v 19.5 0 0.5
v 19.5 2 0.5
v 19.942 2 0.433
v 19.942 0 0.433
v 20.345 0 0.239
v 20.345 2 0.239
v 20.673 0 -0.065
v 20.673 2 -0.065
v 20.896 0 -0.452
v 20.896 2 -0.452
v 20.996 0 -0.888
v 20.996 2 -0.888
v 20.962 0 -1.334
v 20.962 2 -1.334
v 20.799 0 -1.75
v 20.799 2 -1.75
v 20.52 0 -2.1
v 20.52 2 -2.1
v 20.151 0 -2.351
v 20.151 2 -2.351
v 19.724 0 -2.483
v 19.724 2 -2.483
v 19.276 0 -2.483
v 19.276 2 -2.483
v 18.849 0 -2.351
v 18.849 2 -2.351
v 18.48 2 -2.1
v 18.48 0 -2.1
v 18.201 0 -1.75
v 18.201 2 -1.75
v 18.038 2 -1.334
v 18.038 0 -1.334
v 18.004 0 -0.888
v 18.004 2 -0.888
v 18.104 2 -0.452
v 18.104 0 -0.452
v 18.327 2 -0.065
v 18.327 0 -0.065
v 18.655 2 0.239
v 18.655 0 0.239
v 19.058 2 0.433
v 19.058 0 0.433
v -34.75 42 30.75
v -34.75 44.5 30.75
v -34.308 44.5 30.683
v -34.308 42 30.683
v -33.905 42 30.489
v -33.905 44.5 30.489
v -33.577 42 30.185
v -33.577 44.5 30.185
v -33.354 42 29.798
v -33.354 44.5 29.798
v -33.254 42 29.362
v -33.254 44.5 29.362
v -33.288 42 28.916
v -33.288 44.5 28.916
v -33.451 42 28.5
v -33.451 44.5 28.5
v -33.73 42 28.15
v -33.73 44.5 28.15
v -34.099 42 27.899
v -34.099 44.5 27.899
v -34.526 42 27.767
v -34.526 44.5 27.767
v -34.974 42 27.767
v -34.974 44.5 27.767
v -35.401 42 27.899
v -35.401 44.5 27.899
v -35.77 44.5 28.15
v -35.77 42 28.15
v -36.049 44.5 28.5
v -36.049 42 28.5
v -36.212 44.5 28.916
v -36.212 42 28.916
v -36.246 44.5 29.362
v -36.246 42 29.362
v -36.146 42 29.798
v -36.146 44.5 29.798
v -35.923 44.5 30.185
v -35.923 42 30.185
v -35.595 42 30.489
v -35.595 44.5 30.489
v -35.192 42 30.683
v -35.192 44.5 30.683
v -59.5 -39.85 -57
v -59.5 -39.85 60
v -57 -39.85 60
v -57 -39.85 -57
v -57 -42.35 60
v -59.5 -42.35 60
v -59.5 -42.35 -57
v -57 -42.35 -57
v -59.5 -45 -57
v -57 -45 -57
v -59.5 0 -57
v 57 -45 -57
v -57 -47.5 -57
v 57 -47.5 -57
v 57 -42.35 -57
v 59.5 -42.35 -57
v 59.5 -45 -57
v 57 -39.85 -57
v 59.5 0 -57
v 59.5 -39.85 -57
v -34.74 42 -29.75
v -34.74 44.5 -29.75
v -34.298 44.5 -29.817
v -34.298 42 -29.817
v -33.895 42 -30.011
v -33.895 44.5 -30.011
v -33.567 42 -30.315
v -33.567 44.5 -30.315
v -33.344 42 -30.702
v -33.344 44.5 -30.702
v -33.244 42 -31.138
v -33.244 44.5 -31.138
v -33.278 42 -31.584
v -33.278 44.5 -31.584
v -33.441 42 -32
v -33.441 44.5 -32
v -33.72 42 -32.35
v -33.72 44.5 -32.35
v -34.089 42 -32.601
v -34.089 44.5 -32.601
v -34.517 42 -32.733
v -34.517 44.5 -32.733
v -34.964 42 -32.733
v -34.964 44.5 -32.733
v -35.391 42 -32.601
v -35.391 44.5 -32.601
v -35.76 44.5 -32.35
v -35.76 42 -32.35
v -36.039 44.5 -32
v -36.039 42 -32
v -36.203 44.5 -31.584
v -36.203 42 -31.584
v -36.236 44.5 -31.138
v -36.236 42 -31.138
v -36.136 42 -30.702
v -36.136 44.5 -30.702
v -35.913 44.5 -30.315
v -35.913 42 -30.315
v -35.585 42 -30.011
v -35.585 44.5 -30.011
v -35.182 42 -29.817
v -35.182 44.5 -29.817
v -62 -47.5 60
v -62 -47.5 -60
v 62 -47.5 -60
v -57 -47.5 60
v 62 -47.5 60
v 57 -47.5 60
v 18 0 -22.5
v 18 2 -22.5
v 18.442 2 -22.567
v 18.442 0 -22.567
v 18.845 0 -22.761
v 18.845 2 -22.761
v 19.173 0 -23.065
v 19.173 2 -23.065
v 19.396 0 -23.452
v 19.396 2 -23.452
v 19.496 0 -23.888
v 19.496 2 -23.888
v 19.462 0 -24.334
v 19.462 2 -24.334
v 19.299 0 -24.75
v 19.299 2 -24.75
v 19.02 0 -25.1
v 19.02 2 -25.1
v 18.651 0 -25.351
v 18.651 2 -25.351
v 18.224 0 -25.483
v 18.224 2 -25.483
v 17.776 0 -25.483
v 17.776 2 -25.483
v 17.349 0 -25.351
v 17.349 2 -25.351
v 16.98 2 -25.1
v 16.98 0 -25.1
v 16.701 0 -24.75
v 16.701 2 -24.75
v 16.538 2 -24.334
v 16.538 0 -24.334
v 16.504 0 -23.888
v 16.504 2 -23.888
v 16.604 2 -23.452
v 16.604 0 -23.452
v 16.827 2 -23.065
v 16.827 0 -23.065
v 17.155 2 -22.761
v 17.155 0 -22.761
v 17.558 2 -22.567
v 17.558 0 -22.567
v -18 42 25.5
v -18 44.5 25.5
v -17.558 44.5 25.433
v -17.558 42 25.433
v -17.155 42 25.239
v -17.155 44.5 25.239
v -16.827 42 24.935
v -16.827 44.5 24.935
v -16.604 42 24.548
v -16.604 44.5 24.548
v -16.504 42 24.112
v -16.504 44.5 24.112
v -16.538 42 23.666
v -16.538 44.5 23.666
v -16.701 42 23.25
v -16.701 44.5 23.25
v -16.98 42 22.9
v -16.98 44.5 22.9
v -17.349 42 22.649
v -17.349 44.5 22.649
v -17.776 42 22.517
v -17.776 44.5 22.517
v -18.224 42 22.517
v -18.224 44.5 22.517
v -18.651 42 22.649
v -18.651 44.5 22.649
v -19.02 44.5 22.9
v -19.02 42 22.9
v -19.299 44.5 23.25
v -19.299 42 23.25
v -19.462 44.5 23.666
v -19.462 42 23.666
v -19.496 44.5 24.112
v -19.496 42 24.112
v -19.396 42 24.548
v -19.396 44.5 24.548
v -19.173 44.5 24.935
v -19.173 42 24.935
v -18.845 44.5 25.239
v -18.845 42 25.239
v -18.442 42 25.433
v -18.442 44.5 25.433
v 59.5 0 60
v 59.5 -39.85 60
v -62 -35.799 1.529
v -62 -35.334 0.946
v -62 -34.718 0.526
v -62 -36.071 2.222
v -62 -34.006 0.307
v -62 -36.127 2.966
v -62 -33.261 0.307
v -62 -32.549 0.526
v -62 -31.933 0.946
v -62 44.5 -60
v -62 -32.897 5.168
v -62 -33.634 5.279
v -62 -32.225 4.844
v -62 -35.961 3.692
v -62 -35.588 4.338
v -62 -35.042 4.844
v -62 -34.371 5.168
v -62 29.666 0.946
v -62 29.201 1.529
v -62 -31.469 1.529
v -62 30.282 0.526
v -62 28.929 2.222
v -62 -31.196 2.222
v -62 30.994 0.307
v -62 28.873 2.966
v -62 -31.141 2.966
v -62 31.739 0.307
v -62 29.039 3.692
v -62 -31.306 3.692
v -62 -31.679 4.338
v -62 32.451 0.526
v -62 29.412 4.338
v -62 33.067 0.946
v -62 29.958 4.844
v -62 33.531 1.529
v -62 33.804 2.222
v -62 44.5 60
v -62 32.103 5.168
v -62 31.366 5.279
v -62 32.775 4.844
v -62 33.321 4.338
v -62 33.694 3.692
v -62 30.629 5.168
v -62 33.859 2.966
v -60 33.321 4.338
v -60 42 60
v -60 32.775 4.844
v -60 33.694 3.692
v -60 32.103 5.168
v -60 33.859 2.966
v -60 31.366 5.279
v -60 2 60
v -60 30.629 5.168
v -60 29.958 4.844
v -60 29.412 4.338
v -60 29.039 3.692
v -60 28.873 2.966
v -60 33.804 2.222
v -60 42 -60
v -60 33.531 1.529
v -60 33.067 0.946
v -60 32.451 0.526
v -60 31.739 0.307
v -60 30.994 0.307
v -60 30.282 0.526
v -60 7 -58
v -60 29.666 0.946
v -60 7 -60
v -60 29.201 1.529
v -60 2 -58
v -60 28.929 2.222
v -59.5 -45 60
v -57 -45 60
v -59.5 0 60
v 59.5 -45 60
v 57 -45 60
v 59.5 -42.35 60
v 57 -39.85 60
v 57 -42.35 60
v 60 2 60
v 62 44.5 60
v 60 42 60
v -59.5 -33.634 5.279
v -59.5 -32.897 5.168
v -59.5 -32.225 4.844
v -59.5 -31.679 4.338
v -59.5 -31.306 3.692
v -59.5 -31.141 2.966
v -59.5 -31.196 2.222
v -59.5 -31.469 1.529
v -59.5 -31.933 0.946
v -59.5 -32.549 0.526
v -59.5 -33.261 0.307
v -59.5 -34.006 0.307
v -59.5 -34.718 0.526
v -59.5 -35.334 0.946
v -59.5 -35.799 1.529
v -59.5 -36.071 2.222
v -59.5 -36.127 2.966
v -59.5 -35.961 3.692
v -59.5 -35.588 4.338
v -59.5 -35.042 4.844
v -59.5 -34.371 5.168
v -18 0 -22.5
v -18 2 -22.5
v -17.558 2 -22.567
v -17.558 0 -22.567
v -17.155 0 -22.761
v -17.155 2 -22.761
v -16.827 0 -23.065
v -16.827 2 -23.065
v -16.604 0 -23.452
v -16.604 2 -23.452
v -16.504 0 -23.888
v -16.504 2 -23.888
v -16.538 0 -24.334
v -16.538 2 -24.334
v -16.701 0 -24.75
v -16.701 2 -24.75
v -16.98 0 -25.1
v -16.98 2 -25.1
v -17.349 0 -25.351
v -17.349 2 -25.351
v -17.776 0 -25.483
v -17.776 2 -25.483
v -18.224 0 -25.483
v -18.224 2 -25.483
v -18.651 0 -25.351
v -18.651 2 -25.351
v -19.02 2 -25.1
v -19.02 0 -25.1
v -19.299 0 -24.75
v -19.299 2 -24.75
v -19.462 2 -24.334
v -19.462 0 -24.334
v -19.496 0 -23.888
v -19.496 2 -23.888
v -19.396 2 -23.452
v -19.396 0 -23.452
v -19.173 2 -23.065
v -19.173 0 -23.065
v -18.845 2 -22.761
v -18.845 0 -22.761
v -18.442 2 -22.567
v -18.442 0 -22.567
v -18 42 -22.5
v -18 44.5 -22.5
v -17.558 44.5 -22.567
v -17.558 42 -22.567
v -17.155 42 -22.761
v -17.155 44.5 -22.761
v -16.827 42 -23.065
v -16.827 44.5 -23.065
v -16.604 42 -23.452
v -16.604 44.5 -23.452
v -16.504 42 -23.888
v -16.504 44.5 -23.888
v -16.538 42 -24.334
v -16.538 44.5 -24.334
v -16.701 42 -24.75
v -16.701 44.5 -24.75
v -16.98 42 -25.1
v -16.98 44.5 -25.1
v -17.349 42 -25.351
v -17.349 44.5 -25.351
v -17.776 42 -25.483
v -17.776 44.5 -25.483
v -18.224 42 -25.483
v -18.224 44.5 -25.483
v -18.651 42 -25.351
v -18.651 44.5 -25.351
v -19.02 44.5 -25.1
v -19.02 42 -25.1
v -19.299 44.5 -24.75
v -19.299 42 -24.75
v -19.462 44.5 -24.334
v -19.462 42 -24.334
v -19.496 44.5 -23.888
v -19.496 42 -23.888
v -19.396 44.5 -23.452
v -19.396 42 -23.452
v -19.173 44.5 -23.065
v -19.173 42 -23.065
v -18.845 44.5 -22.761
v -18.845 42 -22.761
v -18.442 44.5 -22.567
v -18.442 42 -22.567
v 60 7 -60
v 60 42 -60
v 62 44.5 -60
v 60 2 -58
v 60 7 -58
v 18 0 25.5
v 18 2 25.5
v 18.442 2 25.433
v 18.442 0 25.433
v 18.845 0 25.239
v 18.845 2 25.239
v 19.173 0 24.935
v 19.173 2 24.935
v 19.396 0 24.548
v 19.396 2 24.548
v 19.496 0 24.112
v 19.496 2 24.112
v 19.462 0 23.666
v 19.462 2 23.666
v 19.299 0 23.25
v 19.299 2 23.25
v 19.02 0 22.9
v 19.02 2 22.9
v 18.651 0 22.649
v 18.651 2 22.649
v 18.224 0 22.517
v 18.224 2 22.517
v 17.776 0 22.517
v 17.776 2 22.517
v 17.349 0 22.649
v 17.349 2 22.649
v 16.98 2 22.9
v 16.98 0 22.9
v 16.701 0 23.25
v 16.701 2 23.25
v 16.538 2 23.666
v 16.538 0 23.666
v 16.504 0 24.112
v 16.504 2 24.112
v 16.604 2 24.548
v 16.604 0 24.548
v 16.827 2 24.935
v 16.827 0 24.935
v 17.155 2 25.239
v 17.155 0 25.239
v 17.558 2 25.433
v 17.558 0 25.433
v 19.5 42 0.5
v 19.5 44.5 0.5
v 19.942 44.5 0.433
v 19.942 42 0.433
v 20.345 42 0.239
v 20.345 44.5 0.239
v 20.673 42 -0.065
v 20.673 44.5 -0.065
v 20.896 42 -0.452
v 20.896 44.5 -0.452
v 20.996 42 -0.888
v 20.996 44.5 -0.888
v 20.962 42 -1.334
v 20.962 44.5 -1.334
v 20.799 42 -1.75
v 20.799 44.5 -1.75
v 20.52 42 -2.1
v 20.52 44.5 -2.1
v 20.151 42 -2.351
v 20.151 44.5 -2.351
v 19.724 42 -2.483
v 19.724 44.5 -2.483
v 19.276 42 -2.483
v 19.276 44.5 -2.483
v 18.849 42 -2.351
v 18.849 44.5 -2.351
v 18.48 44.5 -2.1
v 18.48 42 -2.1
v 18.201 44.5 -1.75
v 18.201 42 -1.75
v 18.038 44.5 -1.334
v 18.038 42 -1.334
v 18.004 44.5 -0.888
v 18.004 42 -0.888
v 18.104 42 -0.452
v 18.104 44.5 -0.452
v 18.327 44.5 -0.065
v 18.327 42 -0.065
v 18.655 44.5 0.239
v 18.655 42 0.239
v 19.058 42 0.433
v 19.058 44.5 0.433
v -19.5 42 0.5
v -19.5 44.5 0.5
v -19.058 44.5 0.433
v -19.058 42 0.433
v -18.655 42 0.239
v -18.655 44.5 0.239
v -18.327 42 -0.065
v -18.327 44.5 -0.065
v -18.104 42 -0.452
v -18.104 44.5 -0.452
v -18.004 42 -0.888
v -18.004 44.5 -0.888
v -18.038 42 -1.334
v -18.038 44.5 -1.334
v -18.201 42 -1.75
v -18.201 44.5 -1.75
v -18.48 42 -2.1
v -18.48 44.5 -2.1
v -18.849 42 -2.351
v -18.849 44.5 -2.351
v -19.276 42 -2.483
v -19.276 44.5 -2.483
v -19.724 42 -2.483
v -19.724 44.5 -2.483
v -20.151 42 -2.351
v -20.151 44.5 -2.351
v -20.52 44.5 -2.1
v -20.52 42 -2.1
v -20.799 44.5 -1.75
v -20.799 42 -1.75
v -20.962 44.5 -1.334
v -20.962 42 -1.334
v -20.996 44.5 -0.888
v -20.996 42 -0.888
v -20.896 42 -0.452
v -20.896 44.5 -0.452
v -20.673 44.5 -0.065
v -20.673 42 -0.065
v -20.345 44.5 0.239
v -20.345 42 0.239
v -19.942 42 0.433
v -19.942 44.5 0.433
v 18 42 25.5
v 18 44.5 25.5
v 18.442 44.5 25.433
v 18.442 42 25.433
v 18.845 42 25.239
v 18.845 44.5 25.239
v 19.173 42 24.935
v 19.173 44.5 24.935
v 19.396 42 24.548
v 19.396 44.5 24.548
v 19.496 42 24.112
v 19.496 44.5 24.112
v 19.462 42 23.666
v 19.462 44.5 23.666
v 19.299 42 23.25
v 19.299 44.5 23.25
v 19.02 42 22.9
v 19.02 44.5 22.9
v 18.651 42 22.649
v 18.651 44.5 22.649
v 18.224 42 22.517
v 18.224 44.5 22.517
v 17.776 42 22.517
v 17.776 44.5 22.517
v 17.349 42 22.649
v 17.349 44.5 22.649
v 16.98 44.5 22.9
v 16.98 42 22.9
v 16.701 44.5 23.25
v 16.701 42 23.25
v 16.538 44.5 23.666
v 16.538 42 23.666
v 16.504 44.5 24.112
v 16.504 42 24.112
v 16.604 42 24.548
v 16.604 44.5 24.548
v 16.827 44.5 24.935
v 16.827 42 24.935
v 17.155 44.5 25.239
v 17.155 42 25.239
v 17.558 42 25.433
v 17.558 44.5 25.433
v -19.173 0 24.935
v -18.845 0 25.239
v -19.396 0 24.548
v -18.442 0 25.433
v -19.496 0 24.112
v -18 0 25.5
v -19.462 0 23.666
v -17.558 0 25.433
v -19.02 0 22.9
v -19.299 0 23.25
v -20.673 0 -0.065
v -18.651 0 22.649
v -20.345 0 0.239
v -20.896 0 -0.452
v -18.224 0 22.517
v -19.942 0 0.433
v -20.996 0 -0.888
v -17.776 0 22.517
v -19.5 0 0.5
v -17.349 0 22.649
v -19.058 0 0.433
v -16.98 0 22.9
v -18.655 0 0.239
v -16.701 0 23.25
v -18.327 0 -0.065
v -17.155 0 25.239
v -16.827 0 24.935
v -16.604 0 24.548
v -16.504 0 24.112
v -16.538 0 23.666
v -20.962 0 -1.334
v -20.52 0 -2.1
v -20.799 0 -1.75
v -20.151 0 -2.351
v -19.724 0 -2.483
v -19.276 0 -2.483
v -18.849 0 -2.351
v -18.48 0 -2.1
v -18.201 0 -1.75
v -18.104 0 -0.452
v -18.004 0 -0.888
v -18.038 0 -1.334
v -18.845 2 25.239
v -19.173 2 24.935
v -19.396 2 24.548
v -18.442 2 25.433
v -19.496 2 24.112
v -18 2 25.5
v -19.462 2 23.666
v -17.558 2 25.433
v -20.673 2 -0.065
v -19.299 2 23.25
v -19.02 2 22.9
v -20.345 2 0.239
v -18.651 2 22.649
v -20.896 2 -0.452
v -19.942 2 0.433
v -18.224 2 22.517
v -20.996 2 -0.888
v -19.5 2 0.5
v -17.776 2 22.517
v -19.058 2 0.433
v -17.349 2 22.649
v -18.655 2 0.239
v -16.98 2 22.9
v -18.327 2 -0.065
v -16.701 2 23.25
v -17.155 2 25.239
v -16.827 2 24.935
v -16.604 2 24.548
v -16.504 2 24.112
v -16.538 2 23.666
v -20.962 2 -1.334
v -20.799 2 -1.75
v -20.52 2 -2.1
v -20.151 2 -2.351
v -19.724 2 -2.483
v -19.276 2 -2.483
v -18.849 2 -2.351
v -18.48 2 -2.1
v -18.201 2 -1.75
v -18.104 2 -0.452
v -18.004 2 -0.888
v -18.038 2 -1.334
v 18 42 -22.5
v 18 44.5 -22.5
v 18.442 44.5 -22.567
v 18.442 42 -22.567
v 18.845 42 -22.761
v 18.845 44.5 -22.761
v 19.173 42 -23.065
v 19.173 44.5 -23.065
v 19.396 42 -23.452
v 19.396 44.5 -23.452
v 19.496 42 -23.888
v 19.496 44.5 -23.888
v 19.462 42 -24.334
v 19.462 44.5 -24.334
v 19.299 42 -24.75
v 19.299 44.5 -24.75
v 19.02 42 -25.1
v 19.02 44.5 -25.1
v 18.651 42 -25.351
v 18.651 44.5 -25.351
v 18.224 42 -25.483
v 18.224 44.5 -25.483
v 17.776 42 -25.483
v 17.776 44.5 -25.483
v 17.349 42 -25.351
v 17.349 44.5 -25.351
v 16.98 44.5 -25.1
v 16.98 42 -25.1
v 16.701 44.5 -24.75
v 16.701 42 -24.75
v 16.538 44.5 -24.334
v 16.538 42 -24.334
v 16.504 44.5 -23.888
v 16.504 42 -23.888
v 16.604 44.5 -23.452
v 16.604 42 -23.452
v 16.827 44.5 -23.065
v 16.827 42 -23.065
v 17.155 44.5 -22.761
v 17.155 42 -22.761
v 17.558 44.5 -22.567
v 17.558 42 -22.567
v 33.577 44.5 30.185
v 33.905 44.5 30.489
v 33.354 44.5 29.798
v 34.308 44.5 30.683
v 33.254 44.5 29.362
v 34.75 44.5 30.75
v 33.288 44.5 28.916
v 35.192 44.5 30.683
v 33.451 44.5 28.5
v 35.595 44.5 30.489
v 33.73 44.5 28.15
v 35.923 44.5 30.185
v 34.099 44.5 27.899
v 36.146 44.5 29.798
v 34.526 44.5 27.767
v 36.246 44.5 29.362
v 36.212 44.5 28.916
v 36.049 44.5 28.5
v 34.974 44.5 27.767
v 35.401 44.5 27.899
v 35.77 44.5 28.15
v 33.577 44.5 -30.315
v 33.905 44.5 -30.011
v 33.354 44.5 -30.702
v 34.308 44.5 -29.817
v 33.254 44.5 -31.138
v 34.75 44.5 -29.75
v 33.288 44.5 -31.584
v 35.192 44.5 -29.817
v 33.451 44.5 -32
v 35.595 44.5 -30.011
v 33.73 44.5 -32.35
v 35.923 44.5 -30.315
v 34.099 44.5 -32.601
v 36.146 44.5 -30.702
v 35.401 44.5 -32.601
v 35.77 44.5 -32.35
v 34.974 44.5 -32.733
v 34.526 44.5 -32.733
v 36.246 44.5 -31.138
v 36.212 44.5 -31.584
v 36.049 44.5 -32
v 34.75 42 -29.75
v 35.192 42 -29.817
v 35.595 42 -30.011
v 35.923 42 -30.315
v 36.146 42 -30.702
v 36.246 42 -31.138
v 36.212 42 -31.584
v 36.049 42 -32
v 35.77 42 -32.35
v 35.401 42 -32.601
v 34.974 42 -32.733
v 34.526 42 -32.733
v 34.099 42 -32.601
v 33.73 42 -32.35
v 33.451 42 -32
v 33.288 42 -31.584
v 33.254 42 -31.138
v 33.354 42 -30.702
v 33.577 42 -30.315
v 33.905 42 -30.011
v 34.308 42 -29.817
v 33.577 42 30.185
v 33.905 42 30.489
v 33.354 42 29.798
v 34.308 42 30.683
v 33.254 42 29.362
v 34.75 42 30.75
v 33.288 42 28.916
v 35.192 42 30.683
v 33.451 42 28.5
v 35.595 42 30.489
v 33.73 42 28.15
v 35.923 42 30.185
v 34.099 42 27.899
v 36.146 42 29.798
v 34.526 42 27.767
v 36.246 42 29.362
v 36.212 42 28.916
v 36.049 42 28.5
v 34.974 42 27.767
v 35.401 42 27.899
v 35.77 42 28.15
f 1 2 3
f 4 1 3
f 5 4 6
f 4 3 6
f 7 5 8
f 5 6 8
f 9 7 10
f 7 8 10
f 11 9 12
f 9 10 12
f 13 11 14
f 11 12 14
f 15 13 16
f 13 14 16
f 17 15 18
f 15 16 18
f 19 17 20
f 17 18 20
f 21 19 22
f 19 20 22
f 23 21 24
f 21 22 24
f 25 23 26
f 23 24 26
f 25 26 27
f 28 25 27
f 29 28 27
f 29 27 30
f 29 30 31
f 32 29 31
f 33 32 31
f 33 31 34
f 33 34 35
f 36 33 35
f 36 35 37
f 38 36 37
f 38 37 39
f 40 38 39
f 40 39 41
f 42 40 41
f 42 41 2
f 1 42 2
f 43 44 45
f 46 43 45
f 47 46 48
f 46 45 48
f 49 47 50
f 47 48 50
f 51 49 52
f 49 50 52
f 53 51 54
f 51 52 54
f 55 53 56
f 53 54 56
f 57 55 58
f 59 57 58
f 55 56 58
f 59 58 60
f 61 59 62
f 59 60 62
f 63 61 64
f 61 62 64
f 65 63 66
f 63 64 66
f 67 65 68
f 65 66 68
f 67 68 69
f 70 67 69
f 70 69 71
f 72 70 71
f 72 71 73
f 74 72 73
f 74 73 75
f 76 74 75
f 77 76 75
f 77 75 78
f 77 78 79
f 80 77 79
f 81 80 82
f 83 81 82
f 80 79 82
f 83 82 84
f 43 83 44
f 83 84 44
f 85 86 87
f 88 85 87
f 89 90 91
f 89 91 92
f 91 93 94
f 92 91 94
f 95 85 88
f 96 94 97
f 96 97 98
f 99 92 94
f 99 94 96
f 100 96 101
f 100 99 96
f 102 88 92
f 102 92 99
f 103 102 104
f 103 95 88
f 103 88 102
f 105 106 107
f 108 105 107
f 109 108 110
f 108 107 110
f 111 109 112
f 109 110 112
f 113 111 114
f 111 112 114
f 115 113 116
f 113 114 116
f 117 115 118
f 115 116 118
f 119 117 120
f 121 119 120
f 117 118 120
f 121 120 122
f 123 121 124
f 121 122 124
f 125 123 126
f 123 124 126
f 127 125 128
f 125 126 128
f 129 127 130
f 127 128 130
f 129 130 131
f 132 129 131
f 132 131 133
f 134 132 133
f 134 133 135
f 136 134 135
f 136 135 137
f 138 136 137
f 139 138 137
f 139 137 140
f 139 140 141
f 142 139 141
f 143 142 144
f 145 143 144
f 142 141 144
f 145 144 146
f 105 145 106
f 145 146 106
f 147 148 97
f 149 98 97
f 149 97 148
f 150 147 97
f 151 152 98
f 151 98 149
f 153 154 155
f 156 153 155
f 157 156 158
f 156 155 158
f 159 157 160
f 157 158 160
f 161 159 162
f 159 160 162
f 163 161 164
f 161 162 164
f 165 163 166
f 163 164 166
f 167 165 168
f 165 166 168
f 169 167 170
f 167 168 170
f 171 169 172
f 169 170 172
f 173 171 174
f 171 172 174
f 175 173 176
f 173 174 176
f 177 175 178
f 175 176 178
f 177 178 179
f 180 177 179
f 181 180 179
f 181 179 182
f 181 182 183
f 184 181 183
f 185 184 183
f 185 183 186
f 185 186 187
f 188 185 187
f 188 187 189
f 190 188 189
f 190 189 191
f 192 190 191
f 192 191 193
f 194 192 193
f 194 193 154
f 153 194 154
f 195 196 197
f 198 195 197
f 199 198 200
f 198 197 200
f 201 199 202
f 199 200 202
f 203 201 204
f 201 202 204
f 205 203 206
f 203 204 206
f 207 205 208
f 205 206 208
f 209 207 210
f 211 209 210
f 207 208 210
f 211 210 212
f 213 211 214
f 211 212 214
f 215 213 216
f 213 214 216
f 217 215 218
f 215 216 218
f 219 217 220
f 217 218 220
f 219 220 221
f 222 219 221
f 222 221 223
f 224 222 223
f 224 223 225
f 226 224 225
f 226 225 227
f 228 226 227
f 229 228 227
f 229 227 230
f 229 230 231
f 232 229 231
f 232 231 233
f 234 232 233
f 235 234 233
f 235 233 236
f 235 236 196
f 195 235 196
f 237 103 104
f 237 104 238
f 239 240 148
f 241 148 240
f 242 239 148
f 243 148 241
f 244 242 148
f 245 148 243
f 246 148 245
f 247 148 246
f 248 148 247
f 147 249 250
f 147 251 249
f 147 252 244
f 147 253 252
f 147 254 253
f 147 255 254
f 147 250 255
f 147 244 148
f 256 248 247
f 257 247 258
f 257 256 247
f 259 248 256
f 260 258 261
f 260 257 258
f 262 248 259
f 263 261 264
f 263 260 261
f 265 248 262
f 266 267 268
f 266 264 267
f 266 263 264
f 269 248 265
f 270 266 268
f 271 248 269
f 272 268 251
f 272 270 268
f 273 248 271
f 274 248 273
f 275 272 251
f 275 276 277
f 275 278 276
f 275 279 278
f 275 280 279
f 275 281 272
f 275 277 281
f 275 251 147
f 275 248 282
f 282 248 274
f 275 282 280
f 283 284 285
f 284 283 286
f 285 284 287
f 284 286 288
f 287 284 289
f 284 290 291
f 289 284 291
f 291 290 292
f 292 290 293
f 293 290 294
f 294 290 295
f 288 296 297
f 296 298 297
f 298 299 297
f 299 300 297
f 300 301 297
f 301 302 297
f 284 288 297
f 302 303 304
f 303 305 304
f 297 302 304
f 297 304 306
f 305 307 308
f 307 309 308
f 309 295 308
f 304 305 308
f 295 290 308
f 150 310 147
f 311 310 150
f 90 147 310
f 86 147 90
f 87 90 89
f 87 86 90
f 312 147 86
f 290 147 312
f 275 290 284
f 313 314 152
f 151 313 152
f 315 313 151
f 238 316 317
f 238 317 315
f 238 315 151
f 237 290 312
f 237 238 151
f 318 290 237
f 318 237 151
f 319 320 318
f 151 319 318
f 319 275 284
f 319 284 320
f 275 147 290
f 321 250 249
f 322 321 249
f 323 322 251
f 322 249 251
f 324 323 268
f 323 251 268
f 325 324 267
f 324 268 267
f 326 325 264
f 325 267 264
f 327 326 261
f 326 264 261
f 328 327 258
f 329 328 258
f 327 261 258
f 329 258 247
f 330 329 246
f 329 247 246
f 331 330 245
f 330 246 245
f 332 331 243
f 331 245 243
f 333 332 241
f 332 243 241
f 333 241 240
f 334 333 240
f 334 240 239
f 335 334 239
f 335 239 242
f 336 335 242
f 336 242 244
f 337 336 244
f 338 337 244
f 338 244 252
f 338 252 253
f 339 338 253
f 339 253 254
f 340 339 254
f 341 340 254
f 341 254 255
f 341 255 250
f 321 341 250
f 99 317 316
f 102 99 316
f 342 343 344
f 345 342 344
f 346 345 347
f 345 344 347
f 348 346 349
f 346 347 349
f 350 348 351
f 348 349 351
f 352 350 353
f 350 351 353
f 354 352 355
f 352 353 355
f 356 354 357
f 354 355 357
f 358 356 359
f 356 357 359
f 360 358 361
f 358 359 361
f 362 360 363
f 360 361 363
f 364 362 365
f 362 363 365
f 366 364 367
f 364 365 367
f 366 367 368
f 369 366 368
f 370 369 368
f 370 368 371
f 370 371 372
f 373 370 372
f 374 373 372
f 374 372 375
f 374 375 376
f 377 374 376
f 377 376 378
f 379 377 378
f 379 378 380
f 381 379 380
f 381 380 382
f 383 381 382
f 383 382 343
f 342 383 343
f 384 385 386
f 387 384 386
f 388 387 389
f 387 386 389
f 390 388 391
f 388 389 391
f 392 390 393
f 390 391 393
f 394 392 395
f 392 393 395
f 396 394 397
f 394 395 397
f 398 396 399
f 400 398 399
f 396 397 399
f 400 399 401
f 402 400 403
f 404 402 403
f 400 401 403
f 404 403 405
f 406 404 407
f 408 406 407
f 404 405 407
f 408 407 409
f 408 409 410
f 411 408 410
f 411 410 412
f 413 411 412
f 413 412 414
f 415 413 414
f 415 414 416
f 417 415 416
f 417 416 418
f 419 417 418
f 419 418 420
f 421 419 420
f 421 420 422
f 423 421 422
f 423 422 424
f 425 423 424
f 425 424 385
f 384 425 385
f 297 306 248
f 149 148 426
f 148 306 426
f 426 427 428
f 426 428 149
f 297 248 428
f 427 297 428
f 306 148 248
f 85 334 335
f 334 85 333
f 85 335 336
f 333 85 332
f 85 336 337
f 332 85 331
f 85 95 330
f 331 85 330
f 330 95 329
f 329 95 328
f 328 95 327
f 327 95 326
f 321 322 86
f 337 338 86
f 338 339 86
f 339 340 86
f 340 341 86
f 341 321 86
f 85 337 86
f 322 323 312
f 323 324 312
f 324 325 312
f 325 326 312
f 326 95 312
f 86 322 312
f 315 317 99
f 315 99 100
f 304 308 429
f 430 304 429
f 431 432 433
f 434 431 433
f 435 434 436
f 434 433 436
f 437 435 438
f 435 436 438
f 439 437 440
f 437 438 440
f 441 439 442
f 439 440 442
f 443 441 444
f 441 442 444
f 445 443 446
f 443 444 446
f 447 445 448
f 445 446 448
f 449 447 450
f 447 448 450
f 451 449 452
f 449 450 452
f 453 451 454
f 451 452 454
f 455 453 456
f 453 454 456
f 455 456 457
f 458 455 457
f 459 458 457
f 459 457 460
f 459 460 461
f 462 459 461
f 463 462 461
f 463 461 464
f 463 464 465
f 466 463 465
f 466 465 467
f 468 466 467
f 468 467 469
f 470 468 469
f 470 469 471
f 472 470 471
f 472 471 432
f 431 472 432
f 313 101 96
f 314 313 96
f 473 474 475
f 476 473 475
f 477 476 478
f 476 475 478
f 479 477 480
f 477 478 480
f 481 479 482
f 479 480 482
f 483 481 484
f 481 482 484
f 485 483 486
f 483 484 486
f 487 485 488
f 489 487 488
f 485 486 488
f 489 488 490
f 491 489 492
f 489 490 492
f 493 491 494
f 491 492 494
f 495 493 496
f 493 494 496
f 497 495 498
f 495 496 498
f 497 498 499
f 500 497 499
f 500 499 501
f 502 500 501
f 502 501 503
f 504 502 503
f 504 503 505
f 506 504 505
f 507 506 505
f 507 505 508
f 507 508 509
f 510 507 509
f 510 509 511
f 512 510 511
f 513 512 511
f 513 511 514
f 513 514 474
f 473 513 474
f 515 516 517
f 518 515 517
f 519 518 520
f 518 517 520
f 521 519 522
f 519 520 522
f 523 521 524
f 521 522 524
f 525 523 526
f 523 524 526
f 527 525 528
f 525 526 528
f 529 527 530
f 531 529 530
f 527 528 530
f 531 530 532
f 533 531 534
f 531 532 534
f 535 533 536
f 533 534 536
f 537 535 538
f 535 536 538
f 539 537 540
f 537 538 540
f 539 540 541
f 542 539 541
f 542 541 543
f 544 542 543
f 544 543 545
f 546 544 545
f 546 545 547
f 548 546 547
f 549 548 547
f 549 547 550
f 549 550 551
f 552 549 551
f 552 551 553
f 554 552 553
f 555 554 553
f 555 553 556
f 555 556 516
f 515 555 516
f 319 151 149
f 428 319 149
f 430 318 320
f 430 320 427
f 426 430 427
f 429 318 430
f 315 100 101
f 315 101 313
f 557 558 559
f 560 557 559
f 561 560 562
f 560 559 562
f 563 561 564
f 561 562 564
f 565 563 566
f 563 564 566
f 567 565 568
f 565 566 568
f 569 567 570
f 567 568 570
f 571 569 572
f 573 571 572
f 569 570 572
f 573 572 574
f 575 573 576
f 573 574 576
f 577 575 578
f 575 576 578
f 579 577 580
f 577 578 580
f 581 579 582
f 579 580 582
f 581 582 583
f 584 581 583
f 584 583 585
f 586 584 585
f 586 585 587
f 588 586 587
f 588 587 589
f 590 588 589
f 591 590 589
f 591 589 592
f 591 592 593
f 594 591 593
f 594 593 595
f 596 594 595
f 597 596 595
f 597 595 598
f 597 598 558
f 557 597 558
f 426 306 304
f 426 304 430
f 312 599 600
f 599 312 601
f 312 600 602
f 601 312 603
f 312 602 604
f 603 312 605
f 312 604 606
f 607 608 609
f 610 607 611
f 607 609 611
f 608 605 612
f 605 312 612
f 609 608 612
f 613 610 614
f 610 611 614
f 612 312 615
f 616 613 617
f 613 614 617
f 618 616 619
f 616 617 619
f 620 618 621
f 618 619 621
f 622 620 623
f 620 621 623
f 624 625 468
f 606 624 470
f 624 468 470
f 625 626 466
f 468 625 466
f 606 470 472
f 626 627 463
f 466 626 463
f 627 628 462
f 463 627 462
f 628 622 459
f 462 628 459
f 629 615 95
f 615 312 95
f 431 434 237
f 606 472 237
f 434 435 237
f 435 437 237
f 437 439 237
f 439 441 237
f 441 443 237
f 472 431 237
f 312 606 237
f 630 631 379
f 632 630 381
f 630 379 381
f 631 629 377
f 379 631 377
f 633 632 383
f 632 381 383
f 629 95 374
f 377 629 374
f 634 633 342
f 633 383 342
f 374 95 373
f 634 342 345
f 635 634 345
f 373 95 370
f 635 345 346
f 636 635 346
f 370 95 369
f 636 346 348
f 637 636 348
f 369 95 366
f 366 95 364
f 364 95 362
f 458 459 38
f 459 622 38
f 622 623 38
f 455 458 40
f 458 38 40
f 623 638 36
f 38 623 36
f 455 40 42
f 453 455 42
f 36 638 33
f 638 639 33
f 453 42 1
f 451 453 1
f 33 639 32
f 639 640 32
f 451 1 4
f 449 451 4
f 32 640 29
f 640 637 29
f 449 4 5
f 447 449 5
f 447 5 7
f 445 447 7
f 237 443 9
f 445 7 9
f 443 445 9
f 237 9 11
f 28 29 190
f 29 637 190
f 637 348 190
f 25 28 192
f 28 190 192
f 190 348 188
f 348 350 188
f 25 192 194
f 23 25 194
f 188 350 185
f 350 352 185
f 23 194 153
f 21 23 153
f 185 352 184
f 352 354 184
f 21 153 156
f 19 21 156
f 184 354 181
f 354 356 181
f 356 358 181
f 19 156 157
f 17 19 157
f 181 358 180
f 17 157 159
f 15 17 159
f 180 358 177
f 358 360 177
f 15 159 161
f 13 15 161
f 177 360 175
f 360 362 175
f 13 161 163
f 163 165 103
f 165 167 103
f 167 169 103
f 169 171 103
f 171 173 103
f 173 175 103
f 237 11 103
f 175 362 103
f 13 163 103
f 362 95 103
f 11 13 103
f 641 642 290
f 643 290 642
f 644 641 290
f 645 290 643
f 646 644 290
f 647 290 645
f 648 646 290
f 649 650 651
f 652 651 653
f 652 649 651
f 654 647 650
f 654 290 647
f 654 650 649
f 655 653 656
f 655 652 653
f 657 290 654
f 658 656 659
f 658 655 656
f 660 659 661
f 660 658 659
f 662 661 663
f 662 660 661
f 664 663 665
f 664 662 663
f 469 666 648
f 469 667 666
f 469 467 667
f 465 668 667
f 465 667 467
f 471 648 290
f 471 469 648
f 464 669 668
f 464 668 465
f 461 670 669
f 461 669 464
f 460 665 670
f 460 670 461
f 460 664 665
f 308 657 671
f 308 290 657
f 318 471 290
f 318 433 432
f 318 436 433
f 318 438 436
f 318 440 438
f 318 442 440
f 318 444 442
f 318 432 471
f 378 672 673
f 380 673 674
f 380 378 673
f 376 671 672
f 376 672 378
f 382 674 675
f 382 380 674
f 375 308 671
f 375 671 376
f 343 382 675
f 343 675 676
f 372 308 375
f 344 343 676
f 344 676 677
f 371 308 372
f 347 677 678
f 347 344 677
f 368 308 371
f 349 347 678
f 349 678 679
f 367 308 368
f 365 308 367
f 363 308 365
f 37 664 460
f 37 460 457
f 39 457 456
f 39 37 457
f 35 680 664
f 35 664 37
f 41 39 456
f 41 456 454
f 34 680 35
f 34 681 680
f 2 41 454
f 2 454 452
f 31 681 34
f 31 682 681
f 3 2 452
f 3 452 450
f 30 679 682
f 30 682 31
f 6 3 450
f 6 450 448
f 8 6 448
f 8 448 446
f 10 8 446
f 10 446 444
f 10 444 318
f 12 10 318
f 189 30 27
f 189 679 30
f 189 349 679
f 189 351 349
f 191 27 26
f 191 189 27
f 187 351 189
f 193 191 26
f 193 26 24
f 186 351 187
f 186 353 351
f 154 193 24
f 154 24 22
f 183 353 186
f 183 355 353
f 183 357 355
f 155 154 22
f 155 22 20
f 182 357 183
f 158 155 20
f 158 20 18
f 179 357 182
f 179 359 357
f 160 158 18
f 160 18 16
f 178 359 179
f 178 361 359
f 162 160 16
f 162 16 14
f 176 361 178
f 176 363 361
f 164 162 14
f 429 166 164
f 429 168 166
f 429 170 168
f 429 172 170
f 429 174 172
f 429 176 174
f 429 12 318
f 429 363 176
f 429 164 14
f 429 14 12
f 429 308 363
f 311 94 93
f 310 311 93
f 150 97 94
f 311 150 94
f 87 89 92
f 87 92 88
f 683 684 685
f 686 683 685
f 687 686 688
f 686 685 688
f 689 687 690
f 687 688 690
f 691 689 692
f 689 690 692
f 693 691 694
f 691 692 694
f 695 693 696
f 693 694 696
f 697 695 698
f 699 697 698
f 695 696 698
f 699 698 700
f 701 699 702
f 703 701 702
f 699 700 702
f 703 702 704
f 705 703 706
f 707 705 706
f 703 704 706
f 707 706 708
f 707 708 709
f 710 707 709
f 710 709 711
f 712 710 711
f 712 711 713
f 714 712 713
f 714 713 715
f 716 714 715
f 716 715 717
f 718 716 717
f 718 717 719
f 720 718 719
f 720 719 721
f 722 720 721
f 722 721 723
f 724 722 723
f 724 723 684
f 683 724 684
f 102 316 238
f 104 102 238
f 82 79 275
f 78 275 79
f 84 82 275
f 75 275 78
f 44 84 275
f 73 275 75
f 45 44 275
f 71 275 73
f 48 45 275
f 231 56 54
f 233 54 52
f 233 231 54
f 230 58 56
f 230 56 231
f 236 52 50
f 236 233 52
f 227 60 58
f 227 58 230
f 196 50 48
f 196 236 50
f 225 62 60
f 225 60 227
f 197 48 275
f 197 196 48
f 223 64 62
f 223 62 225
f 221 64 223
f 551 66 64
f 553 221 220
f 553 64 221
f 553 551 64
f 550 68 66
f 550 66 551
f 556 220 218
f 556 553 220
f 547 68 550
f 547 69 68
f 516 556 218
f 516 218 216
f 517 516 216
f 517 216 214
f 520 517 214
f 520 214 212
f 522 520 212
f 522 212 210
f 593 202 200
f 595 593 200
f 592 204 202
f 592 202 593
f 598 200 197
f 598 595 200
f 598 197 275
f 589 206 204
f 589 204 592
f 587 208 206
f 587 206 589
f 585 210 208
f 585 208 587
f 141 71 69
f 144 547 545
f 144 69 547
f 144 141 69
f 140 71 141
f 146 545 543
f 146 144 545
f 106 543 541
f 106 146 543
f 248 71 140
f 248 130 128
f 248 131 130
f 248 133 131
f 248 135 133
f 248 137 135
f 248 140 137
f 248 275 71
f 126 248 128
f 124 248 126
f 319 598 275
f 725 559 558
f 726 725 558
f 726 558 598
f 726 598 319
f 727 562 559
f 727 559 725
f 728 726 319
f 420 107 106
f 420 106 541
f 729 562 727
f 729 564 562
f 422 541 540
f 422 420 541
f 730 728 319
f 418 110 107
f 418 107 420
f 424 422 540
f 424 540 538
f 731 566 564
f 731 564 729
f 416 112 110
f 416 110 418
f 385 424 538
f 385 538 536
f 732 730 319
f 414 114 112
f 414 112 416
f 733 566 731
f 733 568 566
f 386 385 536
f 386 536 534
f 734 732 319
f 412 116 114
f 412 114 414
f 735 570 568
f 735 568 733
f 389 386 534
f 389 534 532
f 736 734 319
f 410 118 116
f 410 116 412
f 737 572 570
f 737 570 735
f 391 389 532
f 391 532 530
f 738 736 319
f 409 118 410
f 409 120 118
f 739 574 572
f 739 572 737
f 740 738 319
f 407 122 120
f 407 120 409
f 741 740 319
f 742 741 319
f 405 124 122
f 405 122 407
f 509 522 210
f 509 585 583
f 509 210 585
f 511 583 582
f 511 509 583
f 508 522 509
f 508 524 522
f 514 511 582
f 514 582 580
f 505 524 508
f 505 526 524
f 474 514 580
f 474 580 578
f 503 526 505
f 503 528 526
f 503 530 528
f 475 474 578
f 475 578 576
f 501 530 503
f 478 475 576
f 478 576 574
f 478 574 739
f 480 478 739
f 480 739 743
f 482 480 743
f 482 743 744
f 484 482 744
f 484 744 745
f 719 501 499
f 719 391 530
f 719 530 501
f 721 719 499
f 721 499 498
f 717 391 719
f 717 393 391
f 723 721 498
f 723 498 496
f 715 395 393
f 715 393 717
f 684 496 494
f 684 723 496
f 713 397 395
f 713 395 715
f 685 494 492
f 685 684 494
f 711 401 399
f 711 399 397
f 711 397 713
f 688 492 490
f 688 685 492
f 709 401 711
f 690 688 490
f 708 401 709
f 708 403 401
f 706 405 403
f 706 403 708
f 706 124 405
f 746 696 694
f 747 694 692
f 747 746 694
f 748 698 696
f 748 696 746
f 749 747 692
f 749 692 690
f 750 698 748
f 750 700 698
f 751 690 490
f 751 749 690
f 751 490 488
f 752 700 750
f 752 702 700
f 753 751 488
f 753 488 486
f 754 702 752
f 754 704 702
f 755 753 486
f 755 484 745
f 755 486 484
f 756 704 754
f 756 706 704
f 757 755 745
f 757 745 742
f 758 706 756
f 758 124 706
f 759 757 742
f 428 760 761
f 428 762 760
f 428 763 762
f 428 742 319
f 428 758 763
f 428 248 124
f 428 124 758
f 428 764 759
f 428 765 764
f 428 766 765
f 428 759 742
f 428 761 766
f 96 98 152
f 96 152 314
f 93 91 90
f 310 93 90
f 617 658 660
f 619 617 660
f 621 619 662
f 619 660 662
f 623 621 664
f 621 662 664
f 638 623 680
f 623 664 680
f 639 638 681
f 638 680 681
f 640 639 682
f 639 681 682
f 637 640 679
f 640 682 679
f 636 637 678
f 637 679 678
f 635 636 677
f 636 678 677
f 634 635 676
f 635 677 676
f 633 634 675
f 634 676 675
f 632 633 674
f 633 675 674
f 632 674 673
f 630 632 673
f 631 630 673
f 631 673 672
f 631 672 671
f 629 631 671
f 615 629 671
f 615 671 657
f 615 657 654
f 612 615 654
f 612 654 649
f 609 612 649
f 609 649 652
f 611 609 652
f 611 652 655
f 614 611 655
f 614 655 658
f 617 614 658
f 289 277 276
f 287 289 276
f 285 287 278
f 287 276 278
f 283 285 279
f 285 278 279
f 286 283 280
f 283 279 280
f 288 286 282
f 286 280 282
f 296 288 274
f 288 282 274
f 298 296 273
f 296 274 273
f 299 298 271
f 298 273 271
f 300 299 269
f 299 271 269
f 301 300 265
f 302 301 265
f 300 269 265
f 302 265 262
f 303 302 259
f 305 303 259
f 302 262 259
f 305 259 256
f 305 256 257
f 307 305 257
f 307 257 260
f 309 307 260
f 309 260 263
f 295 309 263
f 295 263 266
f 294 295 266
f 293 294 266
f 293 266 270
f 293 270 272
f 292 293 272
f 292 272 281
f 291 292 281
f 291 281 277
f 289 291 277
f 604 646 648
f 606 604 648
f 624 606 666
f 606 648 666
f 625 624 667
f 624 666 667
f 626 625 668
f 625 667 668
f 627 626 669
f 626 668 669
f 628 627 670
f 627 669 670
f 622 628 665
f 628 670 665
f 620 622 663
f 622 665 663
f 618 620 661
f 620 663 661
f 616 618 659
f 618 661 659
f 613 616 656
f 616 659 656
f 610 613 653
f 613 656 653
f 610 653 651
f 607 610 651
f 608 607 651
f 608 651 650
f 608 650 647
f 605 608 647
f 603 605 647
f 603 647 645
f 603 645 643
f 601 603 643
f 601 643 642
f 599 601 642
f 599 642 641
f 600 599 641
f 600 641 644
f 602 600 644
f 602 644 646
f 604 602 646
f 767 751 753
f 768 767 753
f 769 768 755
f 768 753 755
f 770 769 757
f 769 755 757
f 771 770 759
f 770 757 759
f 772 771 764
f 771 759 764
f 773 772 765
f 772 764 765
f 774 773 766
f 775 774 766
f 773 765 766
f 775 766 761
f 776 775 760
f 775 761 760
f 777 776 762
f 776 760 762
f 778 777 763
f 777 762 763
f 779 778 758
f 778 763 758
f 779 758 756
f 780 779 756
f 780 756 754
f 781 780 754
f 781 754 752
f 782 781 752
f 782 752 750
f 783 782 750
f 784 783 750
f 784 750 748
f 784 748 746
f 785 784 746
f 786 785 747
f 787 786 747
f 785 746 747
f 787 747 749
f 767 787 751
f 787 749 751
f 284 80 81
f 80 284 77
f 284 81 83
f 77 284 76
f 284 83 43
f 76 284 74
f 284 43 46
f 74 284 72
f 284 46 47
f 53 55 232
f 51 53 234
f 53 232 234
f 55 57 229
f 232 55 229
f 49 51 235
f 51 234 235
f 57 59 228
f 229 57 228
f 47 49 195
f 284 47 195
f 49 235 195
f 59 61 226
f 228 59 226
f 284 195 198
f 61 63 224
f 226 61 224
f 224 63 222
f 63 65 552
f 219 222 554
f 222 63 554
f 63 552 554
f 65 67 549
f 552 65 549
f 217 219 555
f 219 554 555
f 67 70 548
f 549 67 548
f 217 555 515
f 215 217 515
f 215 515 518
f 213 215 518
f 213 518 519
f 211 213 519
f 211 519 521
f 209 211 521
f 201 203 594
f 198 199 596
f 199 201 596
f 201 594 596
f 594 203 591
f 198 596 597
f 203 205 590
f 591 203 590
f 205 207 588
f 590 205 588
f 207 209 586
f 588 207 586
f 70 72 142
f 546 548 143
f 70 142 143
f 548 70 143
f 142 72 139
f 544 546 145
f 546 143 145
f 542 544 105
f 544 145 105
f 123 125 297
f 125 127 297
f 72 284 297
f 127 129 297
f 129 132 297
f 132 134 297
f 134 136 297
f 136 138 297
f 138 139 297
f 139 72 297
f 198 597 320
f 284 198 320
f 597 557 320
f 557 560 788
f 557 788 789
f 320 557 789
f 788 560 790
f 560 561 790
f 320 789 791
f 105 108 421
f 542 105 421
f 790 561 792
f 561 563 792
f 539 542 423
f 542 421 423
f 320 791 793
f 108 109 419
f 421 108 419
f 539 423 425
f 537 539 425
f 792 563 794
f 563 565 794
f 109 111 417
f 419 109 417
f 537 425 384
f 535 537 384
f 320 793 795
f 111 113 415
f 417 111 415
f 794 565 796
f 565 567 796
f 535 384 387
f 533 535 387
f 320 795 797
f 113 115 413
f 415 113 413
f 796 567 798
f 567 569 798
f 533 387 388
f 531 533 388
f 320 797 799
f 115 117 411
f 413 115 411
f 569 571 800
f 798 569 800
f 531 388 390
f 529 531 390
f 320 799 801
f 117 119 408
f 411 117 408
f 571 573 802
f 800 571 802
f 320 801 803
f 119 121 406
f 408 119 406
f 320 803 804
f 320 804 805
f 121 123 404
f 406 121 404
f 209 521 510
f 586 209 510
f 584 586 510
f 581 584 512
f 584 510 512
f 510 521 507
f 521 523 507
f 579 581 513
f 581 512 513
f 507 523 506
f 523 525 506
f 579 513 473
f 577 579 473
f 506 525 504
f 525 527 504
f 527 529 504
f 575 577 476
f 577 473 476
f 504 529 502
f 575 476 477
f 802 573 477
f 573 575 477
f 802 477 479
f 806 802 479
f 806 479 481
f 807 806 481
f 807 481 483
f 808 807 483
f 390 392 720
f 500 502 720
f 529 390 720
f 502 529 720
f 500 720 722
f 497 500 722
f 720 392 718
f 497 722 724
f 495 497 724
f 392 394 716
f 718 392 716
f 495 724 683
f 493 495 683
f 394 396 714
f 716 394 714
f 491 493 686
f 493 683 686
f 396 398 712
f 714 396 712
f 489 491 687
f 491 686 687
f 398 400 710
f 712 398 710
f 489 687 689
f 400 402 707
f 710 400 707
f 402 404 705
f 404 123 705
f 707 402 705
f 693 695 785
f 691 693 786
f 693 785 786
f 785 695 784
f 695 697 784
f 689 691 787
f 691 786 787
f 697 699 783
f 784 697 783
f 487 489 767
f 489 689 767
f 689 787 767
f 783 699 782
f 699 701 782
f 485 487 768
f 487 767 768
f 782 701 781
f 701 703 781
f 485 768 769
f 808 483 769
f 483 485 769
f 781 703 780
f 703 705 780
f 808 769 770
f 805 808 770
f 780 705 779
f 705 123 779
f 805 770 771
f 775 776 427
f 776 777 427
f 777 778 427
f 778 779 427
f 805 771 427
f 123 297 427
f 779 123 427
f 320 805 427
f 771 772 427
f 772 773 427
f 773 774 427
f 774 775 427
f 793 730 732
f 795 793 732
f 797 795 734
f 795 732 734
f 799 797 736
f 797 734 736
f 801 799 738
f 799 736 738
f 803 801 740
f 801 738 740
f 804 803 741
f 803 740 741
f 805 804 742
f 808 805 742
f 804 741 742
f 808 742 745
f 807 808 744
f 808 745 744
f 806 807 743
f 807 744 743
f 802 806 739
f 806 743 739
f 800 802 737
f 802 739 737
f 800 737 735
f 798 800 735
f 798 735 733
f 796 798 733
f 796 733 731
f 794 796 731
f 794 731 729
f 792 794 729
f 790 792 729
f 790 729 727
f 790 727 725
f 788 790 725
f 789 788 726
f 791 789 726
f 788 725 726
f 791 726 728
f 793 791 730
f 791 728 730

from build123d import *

# Parameters (mm, degrees)
SKETCH_2_W          = 124
SKETCH_2_H          = 120
EXTRUDE_1_DEPTH     = 2
SKETCH_3_W          = 2
SKETCH_3_H          = 120
EXTRUDE_2_DEPTH     = 40
SKETCH_4_W          = 120
SKETCH_4_H          = 2
EXTRUDE_3_DEPTH     = 5
SKETCH_6_W          = 124
SKETCH_6_H          = 120
EXTRUDE_4_DEPTH     = 2.5
SKETCH_9_W          = 124
SKETCH_9_H          = 1.5
EXTRUDE_5_DEPTH     = 25
SKETCH_10_R         = 1.5
CUT_EXTRUDE_2_DEPTH = 1.5
SKETCH_11_R         = 1.5
CUT_EXTRUDE_3_DEPTH = 51
SKETCH_12_W         = 2.5
SKETCH_12_H         = 120
EXTRUDE_6_DEPTH     = 47.5
SKETCH_14_W         = 2.5
SKETCH_14_H         = 2.5
EXTRUDE_8_DEPTH     = 120
SKETCH_15_W         = 119
SKETCH_15_H         = 3
EXTRUDE_9_DEPTH     = 47.5
SKETCH_16_R         = 2.5
CUT_EXTRUDE_4_DEPTH = 10
SKETCH_18_W         = 2.5
SKETCH_18_H         = 2.5
EXTRUDE_10_DEPTH    = 120
SKETCH_20_W         = 124
SKETCH_20_H         = 25
CUT_EXTRUDE_5_DEPTH = 10
SKETCH_19_R         = 1.5
CUT_EXTRUDE_6_DEPTH = 2.5


with BuildPart() as part:
    # 草图2 → 凸台-拉伸1 (new body)
    with BuildSketch(Plane(origin=(0, 0, 0), x_dir=(1, 0, 0), z_dir=(0, 1, 0))):
        Rectangle(SKETCH_2_W, SKETCH_2_H)
    extrude(amount=EXTRUDE_1_DEPTH)

    # 草图3 → 凸台-拉伸2 (add)
    with BuildSketch(Plane(origin=(0, 2, 0), x_dir=(1, 0, 0), z_dir=(0, 1, 0))):
        with Locations((-61, 0)):
            Rectangle(SKETCH_3_W, SKETCH_3_H)
        with Locations((61, 0)):
            Rectangle(SKETCH_3_W, SKETCH_3_H)
    extrude(amount=EXTRUDE_2_DEPTH)

    # 草图4 → 凸台-拉伸3 (add)
    with BuildSketch(Plane(origin=(0, 2, 0), x_dir=(1, 0, 0), z_dir=(0, 1, 0))):
        with Locations((0, 59)):
            Rectangle(SKETCH_4_W, SKETCH_4_H)
    extrude(amount=EXTRUDE_3_DEPTH)

    # 草图6 → 凸台-拉伸4 (add)
    with BuildSketch(Plane(origin=(0, 42, 0), x_dir=(1, 0, 0), z_dir=(0, 1, 0))):
        Rectangle(SKETCH_6_W, SKETCH_6_H)
    extrude(amount=EXTRUDE_4_DEPTH)

    # 草图9 → 凸台-拉伸5 (add)
    with BuildSketch(Plane(origin=(0, 44.5, 0), x_dir=(1, 0, 0), z_dir=(0, 1, 0))):
        with Locations((0, 34.25)):
            Rectangle(SKETCH_9_W, SKETCH_9_H)
    extrude(amount=EXTRUDE_5_DEPTH)

    # 草图10 → 切除-拉伸2 (cut)
    with BuildSketch(Plane(origin=(0, 0, -35), x_dir=(-1, 0, 0), z_dir=(0, 0, -1))):
        with Locations((-22.5, 58)):
            Circle(SKETCH_10_R)
        with Locations((22.5, 58)):
            Circle(SKETCH_10_R)
    extrude(amount=-CUT_EXTRUDE_2_DEPTH, mode=Mode.SUBTRACT)

    # 草图11 → 切除-拉伸3 (cut)
    with BuildSketch(Plane(origin=(0, 44.5, 0), x_dir=(1, 0, 0), z_dir=(0, 1, 0))):
        with Locations(Location((-19.5, 1, 0), (0, 0, 270))):
            Circle(SKETCH_11_R)
        with Locations(Location((-18, 24, 0), (0, 0, 270))):
            Circle(SKETCH_11_R)
        with Locations(Location((-18, -24, 0), (0, 0, 270))):
            Circle(SKETCH_11_R)
        with Locations(Location((18, -24, 0), (0, 0, 270))):
            Circle(SKETCH_11_R)
        with Locations(Location((19.5, 1, 0), (0, 0, 270))):
            Circle(SKETCH_11_R)
        with Locations(Location((18, 24, 0), (0, 0, 270))):
            Circle(SKETCH_11_R)
    extrude(amount=-CUT_EXTRUDE_3_DEPTH, mode=Mode.SUBTRACT)

    # 草图12 → 凸台-拉伸6 (add)
    with BuildSketch(Plane.XZ):
        with Locations((-60.75, 0)):
            Rectangle(SKETCH_12_W, SKETCH_12_H)
        with Locations((60.75, 0)):
            Rectangle(SKETCH_12_W, SKETCH_12_H)
    extrude(amount=EXTRUDE_6_DEPTH)

    # 草图14 → 凸台-拉伸8 (add)
    with BuildSketch(Plane(origin=(0, 0, -60), x_dir=(-1, 0, 0), z_dir=(0, 0, -1))):
        with Locations((-58.25, -46.25)):
            Rectangle(SKETCH_14_W, SKETCH_14_H)
        with Locations((58.25, -46.25)):
            Rectangle(SKETCH_14_W, SKETCH_14_H)
    extrude(amount=-EXTRUDE_8_DEPTH)

    # 草图15 → 凸台-拉伸9 (add)
    with BuildSketch(Plane.XZ):
        with Locations((0, -58.5)):
            Rectangle(SKETCH_15_W, SKETCH_15_H)
    extrude(amount=EXTRUDE_9_DEPTH)

    # 草图16 → 切除-拉伸4 (cut)
    with BuildSketch(Plane.ZY.offset(62)):
        with Locations((2.778789214, 31.36631919)):
            Circle(SKETCH_16_R)
        with Locations((2.778789214, -33.63368081)):
            Circle(SKETCH_16_R)
    extrude(amount=-CUT_EXTRUDE_4_DEPTH, mode=Mode.SUBTRACT)

    # 草图18 → 凸台-拉伸10 (add)
    with BuildSketch(Plane.XY.offset(60)):
        with Locations((-58.25, -41.1)):
            Rectangle(SKETCH_18_W, SKETCH_18_H)
        with Locations((58.25, -41.1)):
            Rectangle(SKETCH_18_W, SKETCH_18_H)
    extrude(amount=-EXTRUDE_10_DEPTH)

    # 草图20 → 切除-拉伸5 (cut)
    with BuildSketch(Plane(origin=(0, 0, -35), x_dir=(-1, 0, 0), z_dir=(0, 0, -1))):
        with Locations((0, 57)):
            Rectangle(SKETCH_20_W, SKETCH_20_H)
    extrude(amount=-CUT_EXTRUDE_5_DEPTH, mode=Mode.SUBTRACT)

    # 草图19 → 切除-拉伸6 (cut)
    with BuildSketch(Plane(origin=(0, 44.5, 0), x_dir=(1, 0, 0), z_dir=(0, 1, 0))):
        with Locations(Location((-34.75, -29.25, 0), (0, 0, 270))):
            Circle(SKETCH_19_R)
        with Locations(Location((-34.740182935, 31.25, 0), (0, 0, 270))):
            Circle(SKETCH_19_R)
        with Locations(Location((34.75, 31.25, 0), (0, 0, 270))):
            Circle(SKETCH_19_R)
        with Locations(Location((34.75, -29.25, 0), (0, 0, 270))):
            Circle(SKETCH_19_R)
    extrude(amount=-CUT_EXTRUDE_6_DEPTH, mode=Mode.SUBTRACT)


solid = part.part
